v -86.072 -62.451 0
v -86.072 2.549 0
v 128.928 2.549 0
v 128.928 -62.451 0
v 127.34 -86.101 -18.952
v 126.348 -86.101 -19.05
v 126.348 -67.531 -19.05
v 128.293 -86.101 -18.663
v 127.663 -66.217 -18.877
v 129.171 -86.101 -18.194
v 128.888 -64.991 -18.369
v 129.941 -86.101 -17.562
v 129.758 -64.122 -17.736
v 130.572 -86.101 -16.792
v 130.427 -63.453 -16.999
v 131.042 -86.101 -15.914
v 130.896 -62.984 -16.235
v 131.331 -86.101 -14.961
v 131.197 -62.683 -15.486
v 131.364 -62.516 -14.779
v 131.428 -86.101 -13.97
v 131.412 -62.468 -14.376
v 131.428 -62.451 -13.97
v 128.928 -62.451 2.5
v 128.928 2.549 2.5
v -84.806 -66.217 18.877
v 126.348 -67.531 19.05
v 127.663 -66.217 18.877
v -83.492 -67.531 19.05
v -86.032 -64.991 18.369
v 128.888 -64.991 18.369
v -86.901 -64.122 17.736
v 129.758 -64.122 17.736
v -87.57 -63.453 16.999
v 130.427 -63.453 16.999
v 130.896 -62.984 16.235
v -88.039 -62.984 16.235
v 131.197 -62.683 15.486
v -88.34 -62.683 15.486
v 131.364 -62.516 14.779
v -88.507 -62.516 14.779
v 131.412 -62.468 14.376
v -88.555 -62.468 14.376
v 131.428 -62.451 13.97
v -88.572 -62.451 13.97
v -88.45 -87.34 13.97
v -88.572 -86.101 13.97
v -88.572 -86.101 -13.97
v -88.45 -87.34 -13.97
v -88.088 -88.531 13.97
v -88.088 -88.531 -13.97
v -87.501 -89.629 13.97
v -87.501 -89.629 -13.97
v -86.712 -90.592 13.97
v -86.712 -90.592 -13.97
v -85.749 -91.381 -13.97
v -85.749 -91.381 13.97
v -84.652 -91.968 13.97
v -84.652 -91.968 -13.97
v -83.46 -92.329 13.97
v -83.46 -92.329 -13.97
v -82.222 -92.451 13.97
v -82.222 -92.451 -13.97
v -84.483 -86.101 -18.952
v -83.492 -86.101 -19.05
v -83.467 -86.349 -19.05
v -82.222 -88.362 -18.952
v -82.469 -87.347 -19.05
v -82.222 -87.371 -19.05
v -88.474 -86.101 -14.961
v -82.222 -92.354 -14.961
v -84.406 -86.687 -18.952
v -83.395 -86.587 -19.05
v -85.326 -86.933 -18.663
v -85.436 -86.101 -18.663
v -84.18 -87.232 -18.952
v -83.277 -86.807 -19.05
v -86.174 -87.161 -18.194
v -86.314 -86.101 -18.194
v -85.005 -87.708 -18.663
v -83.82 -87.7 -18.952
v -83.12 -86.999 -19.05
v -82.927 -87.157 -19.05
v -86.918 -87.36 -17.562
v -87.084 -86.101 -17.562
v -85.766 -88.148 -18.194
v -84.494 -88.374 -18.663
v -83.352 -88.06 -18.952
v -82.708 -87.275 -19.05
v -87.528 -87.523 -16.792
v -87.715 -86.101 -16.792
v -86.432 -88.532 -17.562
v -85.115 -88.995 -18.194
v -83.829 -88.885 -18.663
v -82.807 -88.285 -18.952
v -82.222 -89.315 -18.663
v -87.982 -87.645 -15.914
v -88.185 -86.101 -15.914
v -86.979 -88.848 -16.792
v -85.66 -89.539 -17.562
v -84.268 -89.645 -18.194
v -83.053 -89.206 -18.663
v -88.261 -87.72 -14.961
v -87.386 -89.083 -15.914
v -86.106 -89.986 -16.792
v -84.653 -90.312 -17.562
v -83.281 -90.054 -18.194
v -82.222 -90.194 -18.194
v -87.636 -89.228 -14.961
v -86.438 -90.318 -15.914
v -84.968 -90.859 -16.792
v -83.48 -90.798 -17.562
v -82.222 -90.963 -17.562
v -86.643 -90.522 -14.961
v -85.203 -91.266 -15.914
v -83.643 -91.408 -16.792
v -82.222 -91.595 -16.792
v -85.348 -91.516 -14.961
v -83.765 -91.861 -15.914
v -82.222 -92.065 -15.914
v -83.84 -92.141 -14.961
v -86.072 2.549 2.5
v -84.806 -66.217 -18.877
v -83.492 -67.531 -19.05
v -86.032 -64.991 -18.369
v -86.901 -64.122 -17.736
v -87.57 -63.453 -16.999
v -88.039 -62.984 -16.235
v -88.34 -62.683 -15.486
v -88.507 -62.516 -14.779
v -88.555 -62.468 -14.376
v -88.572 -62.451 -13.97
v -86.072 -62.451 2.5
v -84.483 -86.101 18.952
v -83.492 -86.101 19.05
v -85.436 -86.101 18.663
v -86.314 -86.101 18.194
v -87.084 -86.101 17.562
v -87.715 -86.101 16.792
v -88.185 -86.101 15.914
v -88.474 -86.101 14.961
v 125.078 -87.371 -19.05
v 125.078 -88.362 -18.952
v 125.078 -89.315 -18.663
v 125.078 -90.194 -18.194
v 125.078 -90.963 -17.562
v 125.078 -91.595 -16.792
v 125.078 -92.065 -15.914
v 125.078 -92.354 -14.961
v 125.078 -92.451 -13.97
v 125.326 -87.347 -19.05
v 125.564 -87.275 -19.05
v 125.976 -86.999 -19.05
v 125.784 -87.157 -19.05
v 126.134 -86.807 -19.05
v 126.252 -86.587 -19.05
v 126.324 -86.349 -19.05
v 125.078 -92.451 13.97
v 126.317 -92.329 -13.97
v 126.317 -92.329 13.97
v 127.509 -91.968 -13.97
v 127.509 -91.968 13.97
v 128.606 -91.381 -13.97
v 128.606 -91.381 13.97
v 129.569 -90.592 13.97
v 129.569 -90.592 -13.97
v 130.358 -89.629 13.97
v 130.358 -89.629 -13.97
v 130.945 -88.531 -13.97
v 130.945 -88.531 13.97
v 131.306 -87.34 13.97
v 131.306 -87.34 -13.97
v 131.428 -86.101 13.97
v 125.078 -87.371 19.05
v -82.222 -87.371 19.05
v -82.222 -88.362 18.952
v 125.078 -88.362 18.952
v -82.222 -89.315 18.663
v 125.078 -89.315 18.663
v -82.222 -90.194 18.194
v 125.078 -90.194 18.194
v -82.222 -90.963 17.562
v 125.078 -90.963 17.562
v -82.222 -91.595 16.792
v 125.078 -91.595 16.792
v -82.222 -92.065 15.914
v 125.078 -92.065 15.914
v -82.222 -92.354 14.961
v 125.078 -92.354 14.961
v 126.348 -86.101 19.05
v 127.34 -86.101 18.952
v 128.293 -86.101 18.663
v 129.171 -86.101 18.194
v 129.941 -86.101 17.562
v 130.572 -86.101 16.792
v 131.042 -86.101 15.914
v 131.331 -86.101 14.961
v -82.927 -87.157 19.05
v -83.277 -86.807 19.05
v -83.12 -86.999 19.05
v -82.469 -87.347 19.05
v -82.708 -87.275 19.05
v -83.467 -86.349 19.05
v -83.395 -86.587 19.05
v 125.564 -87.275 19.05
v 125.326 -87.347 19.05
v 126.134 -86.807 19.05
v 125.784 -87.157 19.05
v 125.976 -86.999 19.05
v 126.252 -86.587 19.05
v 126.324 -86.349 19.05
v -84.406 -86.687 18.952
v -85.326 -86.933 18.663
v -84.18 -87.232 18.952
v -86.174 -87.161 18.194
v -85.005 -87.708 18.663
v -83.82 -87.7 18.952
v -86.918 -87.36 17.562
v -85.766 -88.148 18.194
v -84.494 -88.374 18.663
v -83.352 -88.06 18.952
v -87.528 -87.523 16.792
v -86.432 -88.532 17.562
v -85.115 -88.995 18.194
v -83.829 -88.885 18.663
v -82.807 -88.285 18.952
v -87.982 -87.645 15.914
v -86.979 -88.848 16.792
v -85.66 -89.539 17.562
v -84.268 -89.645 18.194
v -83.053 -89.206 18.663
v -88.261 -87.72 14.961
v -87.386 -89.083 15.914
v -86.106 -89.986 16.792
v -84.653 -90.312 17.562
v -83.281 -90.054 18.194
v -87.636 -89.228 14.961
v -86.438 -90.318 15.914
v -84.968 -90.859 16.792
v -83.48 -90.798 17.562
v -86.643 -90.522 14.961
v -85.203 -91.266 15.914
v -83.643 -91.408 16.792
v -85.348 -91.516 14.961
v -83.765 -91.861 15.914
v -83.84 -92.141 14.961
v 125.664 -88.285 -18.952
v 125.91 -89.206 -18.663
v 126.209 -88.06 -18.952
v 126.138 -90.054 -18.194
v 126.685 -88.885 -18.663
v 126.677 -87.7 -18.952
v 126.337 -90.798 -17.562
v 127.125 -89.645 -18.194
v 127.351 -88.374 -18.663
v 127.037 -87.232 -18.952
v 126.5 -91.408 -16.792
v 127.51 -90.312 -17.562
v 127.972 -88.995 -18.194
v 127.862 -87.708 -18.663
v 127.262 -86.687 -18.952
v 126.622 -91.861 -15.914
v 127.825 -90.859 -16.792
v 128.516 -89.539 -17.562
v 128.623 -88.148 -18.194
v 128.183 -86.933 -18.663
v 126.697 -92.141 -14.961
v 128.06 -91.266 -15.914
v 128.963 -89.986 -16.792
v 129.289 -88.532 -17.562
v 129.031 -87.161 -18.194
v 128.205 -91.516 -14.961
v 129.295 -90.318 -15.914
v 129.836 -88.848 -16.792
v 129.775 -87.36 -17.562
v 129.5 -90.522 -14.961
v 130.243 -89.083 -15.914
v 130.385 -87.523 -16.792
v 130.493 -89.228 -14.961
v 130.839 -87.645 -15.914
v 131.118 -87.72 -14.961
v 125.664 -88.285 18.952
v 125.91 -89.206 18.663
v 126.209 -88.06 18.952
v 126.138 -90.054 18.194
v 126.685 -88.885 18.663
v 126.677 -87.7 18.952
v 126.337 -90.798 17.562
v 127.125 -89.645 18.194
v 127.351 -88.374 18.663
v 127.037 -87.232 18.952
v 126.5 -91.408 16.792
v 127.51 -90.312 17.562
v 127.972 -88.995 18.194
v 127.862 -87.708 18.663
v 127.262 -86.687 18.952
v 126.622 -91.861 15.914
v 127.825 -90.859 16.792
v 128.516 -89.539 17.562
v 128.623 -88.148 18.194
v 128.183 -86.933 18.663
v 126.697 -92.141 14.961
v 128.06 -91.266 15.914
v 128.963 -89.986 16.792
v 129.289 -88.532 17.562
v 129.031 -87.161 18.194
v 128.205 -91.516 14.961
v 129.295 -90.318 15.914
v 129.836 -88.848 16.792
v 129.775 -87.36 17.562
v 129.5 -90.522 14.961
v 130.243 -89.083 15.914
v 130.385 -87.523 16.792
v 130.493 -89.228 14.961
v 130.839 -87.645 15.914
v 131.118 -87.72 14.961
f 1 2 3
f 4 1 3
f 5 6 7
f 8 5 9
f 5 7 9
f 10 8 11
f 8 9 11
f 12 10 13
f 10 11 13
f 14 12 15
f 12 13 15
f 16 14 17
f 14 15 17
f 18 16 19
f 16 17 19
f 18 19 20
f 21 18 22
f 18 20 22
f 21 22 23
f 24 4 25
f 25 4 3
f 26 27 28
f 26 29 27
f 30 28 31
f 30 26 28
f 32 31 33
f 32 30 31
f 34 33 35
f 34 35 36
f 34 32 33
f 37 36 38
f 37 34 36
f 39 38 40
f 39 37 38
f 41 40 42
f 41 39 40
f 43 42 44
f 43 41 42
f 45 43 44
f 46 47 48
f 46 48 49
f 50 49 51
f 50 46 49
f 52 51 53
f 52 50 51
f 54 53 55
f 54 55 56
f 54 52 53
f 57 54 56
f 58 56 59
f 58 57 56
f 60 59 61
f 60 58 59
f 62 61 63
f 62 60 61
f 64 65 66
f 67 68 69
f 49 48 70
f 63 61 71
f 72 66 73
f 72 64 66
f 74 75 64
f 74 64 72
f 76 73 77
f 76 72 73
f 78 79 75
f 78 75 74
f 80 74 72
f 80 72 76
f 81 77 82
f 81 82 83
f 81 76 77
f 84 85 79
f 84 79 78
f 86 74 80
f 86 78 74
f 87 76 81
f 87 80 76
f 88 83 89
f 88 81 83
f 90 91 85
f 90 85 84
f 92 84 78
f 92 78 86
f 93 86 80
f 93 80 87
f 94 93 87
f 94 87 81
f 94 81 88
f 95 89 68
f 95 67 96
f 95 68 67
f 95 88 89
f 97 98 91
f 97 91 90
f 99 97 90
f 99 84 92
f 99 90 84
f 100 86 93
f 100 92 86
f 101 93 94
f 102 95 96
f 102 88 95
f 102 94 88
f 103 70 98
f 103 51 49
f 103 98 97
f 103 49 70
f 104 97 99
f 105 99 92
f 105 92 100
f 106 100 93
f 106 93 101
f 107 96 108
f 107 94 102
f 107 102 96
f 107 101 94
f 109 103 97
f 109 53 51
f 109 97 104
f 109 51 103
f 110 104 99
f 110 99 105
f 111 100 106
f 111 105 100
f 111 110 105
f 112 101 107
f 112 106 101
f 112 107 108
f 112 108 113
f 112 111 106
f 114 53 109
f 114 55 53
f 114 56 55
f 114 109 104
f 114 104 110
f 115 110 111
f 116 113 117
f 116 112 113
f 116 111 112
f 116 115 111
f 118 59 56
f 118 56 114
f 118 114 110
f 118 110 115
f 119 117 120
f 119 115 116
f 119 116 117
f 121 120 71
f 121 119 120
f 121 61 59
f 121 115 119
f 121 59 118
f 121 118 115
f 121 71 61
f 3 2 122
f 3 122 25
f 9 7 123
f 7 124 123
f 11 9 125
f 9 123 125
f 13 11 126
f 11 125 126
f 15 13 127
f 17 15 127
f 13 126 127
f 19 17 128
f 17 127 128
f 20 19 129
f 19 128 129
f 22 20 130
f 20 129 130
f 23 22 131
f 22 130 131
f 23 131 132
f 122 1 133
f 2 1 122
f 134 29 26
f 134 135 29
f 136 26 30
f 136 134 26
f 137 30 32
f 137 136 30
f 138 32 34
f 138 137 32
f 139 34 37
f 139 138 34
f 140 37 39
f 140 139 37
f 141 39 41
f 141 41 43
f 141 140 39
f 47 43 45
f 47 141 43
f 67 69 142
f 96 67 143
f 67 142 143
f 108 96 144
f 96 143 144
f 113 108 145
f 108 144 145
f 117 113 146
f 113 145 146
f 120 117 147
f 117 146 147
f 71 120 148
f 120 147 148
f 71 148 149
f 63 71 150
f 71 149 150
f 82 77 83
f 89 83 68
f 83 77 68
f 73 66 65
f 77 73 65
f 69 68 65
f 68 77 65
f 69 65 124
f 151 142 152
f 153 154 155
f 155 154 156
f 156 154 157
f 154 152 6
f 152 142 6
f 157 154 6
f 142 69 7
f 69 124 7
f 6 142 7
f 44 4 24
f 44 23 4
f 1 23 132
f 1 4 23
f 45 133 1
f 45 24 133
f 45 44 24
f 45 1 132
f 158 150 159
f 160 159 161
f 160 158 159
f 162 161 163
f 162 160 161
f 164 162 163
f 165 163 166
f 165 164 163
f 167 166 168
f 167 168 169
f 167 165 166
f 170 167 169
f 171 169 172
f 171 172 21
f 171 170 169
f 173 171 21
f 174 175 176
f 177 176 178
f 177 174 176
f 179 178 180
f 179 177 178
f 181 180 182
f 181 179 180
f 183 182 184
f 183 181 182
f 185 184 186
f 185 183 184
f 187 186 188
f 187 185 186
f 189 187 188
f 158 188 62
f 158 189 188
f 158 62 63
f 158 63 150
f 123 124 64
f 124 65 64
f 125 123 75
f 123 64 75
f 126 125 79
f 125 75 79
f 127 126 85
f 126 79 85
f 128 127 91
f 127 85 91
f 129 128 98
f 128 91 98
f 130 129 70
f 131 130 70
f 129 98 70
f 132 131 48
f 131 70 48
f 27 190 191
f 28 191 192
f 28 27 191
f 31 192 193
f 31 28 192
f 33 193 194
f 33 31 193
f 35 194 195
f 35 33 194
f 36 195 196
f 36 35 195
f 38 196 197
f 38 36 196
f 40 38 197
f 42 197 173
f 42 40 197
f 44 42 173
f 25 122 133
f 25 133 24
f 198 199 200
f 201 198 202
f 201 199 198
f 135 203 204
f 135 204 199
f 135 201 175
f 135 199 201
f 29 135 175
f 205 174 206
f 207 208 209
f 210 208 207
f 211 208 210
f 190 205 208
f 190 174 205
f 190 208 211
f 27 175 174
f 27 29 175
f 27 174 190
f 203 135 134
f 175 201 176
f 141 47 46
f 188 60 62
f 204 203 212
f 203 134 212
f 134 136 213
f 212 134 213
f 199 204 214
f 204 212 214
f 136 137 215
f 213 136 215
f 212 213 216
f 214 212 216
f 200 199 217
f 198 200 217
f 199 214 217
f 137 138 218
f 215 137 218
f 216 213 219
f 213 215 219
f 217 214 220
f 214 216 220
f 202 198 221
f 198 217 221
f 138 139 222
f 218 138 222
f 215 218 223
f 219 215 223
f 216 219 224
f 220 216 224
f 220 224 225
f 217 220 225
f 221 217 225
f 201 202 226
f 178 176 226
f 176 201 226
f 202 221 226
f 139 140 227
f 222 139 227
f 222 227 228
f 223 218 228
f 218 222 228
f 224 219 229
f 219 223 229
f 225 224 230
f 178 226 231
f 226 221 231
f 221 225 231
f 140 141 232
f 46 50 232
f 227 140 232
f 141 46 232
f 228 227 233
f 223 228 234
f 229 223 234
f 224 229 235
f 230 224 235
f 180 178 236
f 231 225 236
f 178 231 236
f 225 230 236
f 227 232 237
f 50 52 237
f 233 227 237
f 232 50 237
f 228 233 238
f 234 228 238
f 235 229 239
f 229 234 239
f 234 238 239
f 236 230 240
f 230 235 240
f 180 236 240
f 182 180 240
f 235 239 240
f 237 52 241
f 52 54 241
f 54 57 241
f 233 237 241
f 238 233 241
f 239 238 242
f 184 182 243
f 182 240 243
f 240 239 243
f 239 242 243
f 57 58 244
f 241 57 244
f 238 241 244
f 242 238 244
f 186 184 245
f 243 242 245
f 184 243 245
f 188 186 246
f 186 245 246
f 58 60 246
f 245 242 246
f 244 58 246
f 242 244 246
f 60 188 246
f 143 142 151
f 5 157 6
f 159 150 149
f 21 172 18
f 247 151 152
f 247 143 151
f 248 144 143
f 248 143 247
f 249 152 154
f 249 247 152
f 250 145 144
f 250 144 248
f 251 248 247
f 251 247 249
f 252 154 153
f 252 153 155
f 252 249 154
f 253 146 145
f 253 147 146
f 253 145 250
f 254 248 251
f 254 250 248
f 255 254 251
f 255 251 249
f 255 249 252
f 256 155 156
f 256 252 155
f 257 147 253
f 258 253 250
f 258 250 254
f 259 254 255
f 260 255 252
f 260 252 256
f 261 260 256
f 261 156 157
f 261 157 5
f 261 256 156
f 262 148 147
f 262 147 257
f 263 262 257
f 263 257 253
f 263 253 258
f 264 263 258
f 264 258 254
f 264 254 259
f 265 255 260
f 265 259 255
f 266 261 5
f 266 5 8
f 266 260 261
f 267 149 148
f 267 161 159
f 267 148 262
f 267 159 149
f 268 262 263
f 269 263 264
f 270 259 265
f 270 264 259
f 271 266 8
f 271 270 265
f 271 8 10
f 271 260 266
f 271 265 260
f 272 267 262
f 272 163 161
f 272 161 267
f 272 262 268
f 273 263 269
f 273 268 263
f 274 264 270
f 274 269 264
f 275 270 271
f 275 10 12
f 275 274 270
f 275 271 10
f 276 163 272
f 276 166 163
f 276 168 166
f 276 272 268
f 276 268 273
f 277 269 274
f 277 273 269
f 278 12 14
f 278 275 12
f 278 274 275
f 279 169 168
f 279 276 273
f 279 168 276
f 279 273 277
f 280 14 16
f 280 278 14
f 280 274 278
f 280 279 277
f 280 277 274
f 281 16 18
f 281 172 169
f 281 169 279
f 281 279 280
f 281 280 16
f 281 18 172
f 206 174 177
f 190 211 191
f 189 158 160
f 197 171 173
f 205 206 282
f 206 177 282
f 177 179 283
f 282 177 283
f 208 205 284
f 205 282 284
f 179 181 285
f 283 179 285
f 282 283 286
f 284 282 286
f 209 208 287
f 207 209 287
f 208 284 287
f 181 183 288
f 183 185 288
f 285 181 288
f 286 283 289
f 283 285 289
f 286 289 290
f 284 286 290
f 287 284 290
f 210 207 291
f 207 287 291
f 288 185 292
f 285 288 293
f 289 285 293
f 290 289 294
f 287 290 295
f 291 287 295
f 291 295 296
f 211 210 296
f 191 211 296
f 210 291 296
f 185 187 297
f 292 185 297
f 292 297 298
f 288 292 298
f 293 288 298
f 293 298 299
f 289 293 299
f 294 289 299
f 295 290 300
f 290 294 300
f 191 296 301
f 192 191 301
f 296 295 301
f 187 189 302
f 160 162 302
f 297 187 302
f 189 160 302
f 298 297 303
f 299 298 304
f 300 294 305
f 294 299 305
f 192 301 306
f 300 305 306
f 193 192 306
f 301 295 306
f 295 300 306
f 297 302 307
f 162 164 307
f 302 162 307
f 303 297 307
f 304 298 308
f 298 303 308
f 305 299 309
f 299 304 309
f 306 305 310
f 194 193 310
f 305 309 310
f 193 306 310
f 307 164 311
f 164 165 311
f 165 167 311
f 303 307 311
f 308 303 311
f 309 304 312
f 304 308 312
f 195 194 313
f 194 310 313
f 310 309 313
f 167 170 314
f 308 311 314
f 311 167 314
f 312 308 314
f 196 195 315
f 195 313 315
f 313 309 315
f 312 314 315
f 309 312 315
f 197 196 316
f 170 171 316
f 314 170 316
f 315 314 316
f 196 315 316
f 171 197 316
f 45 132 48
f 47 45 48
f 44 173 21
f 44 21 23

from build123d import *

# Parameters (mm, degrees)
F0_W     = 215
F0_H     = 65
F1_DEPTH = 2.5
F2_DEPTH = 19.05
F3_R     = 5.08


with BuildPart() as f1:
    # F0 (on Top) → F1 (new body)
    with BuildSketch(Plane.XY):
        with Locations((21.428473, -29.951386)):
            Rectangle(F0_W, F0_H)
    extrude(amount=F1_DEPTH)

    # F0 (on Top) → F2 (join, symmetric)
    with BuildSketch(Plane.XY):
        with BuildLine():
            Line((128.928473, -62.451386), (-86.071527, -62.451386))
            Line((-86.071527, -62.451386), (-88.571527, -62.451386))
            Line((-88.571527, -62.451386), (-88.571527, -86.101386))
            ThreePointArc((-88.571527, -86.101386), (-86.711655, -90.591514), (-82.221527, -92.451386))
            Line((-82.221527, -92.451386), (125.078473, -92.451386))
            ThreePointArc((125.078473, -92.451386), (129.568601, -90.591514), (131.428473, -86.101386))
            Line((131.428473, -86.101386), (131.428473, -62.451386))
            Line((131.428473, -62.451386), (128.928473, -62.451386))
        make_face()
    extrude(amount=F2_DEPTH, both=True)

    # F3
    f3_edges = [f1.edges().sort_by_distance(p)[0] for p in [
        (21.428473, -92.451386, 19.05),
        (21.428473, -92.451386, -19.05),
        (21.428473, -62.451386, 19.05),
        (21.428473, -62.451386, -19.05),
    ]]
    fillet(f3_edges, radius=F3_R)


solid = f1.part
